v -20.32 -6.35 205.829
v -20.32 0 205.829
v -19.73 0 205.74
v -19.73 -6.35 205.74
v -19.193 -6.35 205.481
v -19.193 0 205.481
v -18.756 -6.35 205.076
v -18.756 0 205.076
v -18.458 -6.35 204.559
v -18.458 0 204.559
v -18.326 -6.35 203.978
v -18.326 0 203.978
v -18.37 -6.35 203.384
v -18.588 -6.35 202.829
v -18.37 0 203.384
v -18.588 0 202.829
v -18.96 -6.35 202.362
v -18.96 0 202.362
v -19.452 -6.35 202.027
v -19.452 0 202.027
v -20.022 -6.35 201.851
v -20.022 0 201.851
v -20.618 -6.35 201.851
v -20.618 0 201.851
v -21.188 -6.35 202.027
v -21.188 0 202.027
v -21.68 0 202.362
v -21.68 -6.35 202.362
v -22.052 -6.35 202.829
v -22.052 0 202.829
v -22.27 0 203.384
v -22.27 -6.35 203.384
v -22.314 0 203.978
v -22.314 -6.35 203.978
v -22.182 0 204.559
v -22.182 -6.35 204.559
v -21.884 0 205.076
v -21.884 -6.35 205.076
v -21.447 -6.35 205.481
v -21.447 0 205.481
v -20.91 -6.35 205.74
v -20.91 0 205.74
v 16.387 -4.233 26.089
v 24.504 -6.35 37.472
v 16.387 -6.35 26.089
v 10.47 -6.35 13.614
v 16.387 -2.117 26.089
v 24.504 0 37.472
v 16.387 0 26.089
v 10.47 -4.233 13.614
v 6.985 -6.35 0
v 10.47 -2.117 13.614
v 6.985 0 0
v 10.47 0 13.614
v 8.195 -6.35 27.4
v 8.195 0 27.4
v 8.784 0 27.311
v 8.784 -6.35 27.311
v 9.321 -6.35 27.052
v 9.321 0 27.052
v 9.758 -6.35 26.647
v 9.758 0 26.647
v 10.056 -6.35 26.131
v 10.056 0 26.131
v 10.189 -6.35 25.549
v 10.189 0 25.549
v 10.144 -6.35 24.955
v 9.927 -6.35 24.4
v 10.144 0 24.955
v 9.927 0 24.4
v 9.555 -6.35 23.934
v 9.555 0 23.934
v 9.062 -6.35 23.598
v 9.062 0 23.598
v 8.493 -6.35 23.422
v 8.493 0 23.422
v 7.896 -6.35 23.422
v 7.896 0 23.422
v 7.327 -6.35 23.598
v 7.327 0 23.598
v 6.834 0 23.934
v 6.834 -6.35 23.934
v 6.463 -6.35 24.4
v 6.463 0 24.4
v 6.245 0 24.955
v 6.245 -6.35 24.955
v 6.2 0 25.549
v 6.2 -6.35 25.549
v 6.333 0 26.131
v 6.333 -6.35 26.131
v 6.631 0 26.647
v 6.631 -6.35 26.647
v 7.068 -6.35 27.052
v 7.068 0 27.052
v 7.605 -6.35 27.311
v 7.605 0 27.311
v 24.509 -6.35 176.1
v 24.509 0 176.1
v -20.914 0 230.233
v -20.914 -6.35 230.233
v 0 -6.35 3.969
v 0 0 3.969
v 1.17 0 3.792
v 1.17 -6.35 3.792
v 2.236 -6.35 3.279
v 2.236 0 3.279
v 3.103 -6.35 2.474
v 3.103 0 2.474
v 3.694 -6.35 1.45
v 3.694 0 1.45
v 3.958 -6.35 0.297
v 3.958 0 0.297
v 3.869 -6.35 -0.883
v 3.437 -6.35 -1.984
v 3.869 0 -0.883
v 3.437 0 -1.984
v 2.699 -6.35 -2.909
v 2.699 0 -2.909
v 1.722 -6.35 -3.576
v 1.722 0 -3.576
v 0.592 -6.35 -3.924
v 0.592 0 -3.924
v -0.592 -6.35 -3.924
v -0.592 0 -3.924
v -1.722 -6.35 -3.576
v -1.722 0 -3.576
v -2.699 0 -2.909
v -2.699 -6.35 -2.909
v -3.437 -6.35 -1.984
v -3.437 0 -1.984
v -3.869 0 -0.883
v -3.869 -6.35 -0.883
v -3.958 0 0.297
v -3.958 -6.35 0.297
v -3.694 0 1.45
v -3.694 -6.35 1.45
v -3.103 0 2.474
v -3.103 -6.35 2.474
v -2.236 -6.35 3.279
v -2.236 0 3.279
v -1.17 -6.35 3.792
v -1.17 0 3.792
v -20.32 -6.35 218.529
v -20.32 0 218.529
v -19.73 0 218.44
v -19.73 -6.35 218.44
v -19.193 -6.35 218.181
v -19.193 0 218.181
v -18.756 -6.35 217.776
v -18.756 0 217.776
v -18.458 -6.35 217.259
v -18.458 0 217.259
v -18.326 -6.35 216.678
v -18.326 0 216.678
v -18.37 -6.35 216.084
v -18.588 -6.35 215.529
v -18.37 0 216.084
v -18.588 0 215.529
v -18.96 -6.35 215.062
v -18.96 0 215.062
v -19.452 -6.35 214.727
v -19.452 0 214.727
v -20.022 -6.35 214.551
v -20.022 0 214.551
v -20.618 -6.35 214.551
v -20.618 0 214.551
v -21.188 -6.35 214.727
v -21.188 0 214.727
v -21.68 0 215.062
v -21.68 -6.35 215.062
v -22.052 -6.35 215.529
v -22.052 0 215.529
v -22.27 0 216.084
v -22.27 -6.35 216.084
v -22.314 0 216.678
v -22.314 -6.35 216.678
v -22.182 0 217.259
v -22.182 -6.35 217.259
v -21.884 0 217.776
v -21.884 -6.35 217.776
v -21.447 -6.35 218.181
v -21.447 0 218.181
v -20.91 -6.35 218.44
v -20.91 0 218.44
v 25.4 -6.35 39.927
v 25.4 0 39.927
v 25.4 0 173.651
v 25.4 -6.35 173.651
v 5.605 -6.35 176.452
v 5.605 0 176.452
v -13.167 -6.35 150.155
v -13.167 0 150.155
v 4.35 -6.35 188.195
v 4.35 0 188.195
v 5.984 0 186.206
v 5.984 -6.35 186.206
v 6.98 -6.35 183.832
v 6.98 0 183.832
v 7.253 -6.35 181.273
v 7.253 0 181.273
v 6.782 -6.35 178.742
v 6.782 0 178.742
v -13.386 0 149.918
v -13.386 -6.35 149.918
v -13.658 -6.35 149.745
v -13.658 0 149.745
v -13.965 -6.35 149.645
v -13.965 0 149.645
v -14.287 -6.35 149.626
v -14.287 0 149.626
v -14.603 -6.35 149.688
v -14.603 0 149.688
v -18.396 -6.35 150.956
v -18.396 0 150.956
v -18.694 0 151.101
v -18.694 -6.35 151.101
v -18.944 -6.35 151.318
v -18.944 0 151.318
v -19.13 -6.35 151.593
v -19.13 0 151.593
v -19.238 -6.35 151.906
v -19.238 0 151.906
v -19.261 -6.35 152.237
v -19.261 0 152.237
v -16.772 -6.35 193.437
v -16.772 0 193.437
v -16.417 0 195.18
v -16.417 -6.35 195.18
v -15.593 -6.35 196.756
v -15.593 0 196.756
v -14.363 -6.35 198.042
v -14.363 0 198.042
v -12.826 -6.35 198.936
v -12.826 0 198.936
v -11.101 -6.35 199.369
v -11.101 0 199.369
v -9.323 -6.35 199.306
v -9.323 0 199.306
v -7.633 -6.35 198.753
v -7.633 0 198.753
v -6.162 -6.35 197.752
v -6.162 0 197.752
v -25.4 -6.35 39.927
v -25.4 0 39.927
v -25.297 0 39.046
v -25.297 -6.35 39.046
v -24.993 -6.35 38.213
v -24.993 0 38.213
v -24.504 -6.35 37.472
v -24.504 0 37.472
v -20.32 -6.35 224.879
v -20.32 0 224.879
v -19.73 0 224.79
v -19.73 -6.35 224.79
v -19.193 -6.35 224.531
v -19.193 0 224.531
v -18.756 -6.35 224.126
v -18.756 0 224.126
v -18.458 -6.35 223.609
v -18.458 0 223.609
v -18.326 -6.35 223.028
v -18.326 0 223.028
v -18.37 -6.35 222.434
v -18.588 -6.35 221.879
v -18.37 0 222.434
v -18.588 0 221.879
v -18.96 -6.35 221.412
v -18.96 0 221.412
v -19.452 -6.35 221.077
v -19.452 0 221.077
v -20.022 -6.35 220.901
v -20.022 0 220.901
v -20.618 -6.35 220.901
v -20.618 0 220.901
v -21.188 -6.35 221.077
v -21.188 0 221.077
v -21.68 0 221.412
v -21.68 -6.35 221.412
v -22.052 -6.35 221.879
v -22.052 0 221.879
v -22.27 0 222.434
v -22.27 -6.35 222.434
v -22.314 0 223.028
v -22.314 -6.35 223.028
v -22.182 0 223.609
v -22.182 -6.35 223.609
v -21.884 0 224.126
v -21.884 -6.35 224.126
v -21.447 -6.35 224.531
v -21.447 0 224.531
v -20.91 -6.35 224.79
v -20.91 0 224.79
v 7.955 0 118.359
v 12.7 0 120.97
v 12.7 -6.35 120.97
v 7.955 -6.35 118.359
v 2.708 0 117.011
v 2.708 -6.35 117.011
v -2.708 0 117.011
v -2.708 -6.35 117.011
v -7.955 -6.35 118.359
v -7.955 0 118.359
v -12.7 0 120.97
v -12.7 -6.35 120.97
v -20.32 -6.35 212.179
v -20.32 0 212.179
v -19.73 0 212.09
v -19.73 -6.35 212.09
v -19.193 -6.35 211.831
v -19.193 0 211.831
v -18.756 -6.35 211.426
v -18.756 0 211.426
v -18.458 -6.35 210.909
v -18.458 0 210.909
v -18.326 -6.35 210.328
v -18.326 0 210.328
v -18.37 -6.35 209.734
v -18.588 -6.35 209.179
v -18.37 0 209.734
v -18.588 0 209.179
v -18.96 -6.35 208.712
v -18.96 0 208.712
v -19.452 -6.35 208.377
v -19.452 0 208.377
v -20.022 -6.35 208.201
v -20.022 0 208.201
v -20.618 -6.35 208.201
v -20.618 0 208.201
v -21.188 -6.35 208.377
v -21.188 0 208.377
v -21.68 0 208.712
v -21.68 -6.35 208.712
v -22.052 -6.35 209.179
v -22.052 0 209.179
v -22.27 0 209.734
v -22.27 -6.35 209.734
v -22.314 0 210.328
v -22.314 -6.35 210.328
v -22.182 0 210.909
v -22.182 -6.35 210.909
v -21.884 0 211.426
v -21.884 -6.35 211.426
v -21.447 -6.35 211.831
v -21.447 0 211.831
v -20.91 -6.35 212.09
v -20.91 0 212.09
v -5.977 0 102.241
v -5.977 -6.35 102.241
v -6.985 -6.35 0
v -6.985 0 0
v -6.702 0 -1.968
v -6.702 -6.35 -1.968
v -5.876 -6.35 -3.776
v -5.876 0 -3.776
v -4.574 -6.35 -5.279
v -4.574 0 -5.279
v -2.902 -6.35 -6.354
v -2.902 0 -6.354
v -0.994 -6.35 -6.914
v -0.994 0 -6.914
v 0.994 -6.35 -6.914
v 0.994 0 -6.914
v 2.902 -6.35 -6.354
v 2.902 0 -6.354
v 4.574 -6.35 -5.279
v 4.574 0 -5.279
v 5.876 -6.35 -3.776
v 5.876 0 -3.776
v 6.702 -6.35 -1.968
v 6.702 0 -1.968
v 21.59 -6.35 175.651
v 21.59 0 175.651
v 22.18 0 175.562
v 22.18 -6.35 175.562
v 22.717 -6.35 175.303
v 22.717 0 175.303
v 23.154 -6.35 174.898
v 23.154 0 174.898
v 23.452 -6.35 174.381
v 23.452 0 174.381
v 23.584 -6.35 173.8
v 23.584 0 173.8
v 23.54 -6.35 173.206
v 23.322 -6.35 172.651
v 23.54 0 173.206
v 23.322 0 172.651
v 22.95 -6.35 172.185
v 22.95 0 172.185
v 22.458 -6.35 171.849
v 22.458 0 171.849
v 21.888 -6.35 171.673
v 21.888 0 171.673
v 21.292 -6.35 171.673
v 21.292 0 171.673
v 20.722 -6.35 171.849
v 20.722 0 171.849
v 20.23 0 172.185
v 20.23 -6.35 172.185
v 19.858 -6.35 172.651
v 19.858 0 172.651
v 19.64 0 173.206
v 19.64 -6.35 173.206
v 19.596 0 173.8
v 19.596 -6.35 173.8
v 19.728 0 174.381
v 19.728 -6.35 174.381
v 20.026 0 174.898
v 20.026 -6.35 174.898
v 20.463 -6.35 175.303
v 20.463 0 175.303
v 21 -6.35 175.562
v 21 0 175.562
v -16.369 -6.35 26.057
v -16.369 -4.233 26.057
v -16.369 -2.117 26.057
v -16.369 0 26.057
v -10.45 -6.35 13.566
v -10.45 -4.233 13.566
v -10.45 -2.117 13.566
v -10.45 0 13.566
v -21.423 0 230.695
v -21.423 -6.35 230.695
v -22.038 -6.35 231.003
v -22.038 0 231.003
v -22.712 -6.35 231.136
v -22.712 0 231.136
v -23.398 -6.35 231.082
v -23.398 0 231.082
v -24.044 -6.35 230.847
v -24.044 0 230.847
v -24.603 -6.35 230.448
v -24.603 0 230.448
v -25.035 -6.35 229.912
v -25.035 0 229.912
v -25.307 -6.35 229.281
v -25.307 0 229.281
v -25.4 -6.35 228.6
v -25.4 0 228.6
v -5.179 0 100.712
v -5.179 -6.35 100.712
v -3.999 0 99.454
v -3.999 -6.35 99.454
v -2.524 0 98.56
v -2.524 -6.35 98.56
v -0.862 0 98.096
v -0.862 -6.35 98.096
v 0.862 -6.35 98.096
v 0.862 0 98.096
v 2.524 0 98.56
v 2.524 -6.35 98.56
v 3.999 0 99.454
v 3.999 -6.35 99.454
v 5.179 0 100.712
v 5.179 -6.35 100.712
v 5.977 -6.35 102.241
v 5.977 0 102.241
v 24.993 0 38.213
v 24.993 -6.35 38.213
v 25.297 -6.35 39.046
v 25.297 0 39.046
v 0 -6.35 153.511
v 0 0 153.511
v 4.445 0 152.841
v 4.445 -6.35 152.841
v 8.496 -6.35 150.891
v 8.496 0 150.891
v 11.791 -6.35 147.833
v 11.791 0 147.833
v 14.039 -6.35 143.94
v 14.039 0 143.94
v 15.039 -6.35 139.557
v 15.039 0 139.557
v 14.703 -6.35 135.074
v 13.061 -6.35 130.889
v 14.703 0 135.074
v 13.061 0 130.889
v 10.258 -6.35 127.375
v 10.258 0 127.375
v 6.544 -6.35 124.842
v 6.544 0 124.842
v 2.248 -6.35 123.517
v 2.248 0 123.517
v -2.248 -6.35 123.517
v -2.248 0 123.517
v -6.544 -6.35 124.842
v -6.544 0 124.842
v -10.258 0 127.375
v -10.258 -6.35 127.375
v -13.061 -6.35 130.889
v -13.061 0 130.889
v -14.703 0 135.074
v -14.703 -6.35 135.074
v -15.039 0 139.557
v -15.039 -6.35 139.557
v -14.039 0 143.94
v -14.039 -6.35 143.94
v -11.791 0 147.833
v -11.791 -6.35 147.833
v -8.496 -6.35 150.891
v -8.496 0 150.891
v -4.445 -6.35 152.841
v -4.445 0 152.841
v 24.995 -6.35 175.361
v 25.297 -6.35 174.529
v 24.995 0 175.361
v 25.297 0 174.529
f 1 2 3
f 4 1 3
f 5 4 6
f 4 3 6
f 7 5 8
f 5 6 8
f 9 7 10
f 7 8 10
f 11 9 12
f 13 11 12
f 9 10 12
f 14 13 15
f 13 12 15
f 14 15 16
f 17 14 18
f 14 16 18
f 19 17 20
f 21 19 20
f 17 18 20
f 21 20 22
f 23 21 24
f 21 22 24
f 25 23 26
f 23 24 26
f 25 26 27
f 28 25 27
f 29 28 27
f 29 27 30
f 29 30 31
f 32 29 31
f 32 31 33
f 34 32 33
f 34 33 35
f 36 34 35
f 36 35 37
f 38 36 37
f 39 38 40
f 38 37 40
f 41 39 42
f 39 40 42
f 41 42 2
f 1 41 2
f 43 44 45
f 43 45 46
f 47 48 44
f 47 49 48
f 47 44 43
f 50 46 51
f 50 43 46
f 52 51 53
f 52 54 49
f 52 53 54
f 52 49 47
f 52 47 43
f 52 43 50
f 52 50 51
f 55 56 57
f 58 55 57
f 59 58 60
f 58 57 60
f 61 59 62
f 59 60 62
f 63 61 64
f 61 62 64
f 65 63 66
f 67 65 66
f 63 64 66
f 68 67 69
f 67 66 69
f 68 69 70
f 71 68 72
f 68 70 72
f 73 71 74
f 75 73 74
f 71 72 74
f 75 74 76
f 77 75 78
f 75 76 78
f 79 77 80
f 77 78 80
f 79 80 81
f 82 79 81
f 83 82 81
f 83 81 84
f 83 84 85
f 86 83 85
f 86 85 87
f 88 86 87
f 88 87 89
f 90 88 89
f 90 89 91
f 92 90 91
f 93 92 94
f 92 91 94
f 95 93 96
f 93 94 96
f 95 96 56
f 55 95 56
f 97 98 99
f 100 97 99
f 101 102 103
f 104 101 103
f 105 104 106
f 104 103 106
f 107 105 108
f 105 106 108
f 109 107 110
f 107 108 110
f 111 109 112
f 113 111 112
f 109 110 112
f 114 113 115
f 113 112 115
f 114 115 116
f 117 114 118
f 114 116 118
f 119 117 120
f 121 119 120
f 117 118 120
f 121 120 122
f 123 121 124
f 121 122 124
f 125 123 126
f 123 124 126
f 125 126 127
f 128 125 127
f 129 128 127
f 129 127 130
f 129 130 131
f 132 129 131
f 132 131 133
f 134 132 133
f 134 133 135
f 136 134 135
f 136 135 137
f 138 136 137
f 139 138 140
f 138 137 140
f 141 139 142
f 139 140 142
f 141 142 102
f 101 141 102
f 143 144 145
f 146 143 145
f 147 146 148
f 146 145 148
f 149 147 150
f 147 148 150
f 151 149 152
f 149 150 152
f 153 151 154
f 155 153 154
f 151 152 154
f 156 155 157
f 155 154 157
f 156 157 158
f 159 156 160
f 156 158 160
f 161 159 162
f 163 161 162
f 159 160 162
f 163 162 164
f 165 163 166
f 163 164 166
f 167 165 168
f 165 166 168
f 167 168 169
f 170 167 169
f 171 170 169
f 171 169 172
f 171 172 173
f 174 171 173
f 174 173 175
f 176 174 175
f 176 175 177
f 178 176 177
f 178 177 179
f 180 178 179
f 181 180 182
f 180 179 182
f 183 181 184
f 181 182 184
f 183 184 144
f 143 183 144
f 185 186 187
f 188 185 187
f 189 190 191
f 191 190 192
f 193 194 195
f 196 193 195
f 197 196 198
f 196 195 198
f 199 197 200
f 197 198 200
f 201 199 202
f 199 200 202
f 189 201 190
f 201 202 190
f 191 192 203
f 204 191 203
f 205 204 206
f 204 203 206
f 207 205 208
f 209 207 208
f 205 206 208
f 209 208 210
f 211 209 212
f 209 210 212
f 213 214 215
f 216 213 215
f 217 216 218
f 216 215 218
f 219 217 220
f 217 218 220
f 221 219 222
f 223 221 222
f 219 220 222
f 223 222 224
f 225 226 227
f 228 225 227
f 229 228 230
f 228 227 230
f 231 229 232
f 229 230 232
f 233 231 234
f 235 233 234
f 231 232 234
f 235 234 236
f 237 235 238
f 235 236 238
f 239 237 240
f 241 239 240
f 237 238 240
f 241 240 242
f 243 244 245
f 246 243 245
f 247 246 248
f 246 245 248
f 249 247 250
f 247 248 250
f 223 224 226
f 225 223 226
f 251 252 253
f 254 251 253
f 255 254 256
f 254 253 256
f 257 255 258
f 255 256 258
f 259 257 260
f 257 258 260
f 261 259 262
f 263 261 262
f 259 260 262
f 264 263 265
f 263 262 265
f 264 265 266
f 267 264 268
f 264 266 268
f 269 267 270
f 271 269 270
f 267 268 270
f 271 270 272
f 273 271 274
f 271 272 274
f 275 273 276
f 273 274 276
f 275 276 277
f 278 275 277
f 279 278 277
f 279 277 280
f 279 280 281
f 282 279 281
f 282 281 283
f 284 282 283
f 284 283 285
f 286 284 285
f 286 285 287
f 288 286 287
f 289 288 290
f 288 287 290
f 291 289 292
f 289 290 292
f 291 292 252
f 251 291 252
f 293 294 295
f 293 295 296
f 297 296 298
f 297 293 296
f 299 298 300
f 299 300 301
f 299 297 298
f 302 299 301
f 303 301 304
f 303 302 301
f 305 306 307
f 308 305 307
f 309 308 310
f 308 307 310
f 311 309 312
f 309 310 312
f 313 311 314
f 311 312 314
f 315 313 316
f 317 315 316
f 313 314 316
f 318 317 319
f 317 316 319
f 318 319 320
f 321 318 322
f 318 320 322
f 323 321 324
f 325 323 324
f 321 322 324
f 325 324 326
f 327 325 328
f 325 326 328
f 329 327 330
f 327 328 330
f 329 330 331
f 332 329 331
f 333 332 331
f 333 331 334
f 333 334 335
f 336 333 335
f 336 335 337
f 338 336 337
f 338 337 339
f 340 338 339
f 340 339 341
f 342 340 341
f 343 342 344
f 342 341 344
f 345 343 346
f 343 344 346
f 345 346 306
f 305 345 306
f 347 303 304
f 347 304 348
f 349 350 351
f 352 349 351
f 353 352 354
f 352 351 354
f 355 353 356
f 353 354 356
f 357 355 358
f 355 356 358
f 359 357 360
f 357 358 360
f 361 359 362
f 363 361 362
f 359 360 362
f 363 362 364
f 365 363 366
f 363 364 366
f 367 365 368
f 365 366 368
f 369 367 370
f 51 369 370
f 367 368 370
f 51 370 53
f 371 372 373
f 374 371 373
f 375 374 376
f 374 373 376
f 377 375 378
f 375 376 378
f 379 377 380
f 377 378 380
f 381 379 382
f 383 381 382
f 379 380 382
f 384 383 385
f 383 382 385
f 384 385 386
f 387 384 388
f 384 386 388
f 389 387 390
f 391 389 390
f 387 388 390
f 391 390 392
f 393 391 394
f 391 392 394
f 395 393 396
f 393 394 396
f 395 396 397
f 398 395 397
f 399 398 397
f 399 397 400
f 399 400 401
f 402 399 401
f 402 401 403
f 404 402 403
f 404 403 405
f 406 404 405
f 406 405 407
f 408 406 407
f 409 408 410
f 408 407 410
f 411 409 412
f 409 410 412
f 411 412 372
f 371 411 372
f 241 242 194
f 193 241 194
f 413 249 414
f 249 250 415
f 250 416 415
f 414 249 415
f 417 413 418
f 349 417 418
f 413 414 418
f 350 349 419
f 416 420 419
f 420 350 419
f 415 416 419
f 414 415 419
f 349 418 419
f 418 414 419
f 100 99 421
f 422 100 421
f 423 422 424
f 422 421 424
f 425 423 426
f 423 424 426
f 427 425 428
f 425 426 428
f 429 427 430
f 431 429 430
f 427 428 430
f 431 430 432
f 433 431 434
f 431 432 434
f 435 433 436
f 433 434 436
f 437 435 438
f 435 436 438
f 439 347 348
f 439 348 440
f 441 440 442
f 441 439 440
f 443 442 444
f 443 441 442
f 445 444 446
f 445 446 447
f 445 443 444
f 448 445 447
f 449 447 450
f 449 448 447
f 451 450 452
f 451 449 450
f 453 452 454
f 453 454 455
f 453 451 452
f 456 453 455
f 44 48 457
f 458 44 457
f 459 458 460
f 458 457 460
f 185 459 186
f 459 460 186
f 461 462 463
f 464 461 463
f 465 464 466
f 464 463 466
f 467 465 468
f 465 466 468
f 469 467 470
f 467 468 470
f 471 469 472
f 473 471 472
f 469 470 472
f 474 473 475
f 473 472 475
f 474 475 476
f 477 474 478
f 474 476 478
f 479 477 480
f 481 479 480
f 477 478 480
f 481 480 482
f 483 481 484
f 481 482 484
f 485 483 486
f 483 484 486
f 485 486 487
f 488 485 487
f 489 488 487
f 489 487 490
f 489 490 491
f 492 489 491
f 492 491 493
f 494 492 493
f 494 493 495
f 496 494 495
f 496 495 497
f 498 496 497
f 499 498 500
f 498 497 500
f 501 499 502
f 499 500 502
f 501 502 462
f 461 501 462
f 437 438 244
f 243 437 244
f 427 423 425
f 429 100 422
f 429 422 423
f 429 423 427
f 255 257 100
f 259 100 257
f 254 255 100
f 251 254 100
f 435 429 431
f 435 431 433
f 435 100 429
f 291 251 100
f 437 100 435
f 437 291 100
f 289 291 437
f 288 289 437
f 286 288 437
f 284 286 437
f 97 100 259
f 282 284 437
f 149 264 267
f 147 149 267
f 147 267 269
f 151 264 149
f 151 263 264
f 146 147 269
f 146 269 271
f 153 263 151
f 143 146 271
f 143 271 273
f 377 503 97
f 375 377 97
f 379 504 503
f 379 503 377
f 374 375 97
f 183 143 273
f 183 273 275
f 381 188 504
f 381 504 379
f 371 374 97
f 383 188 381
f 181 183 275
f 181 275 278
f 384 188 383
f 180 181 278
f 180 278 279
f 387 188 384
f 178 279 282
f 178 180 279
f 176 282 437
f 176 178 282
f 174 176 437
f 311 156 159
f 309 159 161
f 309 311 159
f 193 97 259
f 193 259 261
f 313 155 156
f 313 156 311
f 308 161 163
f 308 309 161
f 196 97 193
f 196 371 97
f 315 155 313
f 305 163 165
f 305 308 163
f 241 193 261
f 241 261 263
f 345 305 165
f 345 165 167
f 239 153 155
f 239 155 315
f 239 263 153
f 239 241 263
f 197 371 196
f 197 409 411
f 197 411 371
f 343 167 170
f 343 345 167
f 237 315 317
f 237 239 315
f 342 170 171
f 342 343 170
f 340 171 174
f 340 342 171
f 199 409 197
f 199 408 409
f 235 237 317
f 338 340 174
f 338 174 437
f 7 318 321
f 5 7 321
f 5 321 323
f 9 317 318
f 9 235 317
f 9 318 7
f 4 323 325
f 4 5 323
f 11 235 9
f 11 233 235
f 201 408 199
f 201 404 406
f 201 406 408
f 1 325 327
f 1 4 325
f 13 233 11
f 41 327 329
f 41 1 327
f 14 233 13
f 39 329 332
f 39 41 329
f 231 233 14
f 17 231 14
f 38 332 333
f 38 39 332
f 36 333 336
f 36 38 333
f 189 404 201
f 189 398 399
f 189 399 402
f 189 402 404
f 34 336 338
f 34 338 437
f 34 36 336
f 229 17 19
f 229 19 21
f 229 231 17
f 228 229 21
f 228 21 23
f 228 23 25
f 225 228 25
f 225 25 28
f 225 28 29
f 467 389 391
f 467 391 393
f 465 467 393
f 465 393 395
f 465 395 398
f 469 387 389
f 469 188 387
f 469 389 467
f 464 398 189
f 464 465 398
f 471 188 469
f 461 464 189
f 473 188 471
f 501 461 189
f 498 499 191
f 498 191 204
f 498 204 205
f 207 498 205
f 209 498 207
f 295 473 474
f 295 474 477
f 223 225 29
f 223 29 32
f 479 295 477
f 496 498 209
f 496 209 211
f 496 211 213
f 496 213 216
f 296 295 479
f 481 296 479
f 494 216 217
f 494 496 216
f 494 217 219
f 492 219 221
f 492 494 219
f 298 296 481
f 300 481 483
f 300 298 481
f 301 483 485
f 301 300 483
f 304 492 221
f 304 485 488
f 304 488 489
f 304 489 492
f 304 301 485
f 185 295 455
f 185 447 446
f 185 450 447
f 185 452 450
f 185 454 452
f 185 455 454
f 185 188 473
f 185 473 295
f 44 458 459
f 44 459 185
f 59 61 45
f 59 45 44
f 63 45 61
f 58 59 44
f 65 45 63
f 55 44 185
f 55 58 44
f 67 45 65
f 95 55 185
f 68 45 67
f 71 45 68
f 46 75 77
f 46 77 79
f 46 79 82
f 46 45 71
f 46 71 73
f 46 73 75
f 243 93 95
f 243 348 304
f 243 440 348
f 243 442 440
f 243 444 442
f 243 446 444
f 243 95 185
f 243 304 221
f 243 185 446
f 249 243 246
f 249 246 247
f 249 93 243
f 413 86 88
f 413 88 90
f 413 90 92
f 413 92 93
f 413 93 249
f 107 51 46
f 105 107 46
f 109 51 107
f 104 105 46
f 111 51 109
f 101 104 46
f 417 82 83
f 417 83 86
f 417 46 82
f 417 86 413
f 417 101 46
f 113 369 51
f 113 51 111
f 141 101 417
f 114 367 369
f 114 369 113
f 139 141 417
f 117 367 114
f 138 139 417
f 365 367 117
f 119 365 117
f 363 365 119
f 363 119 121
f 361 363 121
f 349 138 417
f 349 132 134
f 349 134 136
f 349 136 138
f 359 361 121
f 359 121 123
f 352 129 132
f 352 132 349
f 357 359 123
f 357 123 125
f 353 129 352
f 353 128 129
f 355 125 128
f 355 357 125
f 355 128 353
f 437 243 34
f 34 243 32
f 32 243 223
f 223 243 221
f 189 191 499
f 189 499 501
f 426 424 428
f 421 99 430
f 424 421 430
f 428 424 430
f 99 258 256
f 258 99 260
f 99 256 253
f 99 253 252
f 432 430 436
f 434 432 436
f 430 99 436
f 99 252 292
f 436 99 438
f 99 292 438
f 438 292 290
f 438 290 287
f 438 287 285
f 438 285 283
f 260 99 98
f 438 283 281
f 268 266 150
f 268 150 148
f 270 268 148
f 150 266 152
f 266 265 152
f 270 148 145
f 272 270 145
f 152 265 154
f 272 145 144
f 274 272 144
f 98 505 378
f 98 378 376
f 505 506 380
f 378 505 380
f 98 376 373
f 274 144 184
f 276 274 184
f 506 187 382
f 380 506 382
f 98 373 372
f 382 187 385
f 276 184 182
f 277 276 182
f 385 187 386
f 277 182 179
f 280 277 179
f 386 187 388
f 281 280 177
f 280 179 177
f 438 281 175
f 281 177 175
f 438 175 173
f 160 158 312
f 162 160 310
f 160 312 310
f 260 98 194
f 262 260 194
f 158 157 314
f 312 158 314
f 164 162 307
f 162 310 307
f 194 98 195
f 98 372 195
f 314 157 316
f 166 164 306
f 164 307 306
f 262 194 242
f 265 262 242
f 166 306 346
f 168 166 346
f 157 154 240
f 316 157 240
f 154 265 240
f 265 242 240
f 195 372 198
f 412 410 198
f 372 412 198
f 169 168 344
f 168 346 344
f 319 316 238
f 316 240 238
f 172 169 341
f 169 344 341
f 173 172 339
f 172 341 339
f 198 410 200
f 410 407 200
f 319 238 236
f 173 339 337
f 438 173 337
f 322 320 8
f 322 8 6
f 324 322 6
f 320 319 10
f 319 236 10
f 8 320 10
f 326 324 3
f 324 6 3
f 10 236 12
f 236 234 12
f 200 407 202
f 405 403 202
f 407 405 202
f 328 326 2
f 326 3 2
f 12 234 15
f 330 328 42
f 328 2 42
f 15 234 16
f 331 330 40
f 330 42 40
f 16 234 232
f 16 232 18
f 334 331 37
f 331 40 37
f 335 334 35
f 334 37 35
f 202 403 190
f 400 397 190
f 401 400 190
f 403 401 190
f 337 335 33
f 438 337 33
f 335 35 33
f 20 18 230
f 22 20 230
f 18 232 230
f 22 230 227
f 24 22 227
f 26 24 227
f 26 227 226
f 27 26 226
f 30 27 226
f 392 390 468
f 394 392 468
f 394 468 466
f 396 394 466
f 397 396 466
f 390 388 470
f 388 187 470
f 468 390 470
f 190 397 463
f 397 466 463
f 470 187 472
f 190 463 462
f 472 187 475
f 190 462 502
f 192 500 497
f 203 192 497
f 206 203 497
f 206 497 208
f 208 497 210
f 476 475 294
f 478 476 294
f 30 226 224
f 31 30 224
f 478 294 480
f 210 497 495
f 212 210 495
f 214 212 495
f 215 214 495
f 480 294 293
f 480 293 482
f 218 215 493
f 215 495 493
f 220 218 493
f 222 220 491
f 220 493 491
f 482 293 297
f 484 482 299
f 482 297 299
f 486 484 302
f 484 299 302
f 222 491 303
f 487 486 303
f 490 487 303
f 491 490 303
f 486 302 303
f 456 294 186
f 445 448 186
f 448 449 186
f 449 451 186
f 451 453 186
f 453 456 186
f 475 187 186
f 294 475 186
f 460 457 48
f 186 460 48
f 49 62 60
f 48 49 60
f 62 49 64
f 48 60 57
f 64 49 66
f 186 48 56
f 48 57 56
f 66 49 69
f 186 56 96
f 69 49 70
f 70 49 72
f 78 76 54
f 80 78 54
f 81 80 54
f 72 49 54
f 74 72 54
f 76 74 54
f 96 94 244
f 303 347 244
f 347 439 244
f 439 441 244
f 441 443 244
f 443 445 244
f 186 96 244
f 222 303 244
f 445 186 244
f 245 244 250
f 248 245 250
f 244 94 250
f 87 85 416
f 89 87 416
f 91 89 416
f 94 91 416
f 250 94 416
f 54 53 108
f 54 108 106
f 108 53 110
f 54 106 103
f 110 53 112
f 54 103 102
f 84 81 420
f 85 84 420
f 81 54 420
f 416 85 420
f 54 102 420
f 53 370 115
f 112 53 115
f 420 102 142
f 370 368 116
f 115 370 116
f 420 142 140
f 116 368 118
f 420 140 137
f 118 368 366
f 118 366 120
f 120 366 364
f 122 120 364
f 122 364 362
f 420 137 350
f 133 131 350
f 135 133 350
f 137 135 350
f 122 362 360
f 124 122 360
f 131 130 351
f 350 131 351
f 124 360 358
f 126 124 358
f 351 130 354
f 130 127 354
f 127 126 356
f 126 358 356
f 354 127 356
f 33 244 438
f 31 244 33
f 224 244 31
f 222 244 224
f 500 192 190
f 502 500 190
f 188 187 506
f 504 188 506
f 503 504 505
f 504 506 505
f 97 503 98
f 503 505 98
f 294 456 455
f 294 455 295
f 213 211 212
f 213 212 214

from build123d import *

# Parameters (mm, degrees)
SKETCH1_R           = 3.96875
SKETCH1_R_2         = 15.08125
SKETCH1_R_3         = 2
BOSS_EXTRUDE1_DEPTH = 6.35


with BuildPart() as part:
    # Sketch1 → Boss-Extrude1 (new body)
    with BuildSketch(Plane(origin=(0, 0, 0), x_dir=(1, 0, 0), z_dir=(0, 1, 0))):
        with BuildLine():
            Line((25.4, -39.926769414), (25.4, -173.650783549))
            ThreePointArc((25.4, -173.650783549), (25.170228885, -174.953880295), (24.508629328, -176.099804342))
            Line((24.508629328, -176.099804342), (-20.914247114, -230.232680529))
            ThreePointArc((-20.914247114, -230.232680529), (-23.728731164, -230.986819257), (-25.4, -228.6))
            Line((-25.4, -228.6), (-25.4, -39.926769414))
            ThreePointArc((-25.4, -39.926769414), (-25.169027772, -38.620377357), (-24.504115377, -37.472379149))
            add(Edge.make_bspline(
                [(-24.504115377, -37.472379149), (-15.341464403, -26.593497135), (-9.143369894, -14.104472305), (-6.985, 0)],
                knots=[0.031078099, 0.031078099, 0.031078099, 0.031078099, 1, 1, 1, 1], degree=3))
            ThreePointArc((-6.985, 0), (0, 6.985), (6.985, 0))
            add(Edge.make_bspline(
                [(24.504115377, -37.472379149), (15.363034866, -26.619107902), (9.178211427, -14.199965817), (6.985, 0)],
                knots=[0.031766068, 0.031766068, 0.031766068, 0.031766068, 1, 1, 1, 1], degree=3))
            ThreePointArc((24.504115377, -37.472379149), (25.169027772, -38.620377357), (25.4, -39.926769414))
        make_face()
        with Locations(Location((0, 0, 0), (0, 0, 270))):
            Circle(SKETCH1_R, mode=Mode.SUBTRACT)
        with Locations(Location((0, -138.43, 0), (0, 0, 270))):
            Circle(SKETCH1_R_2, mode=Mode.SUBTRACT)
        with Locations(Location((-20.32, -222.878592645, 0), (0, 0, 270))):
            Circle(SKETCH1_R_3, mode=Mode.SUBTRACT)
        with Locations(Location((-20.32, -216.528592645, 0), (0, 0, 270))):
            Circle(SKETCH1_R_3, mode=Mode.SUBTRACT)
        with Locations(Location((-20.32, -210.178592645, 0), (0, 0, 270))):
            Circle(SKETCH1_R_3, mode=Mode.SUBTRACT)
        with Locations(Location((-20.32, -203.828592645, 0), (0, 0, 270))):
            Circle(SKETCH1_R_3, mode=Mode.SUBTRACT)
        with Locations(Location((21.59, -173.650783549, 0), (0, 0, 270))):
            Circle(SKETCH1_R_3, mode=Mode.SUBTRACT)
        with Locations(Location((8.19455983, -25.4, 0), (0, 0, 270))):
            Circle(SKETCH1_R_3, mode=Mode.SUBTRACT)
        with BuildLine():
            Line((5.605496622, -176.452263434), (-13.166879596, -150.15491695))
            ThreePointArc((-13.166879596, -150.15491695), (-13.808086261, -149.684948511), (-14.603073846, -149.688274478))
            Line((-14.603073846, -149.688274478), (-18.395861473, -150.955793975))
            ThreePointArc((-18.395861473, -150.955793975), (-19.045805463, -151.449552817), (-19.26101006, -152.2368977))
            Line((-19.26101006, -152.2368977), (-16.771936742, -193.436924326))
            ThreePointArc((-16.771936742, -193.436924326), (-12.825939472, -198.936057494), (-6.161826947, -197.752434107))
            Line((-6.161826947, -197.752434107), (4.350250475, -188.195205906))
            ThreePointArc((4.350250475, -188.195205906), (7.209558699, -182.562287673), (5.605496622, -176.452263434))
        make_face(mode=Mode.SUBTRACT)
        with BuildLine():
            Line((-12.7, -120.970386602), (-5.976567434, -102.241338504))
            ThreePointArc((-5.976567434, -102.241338504), (0, -98.036831852), (5.976567434, -102.241338504))
            Line((5.976567434, -102.241338504), (12.7, -120.970386602))
            ThreePointArc((12.7, -120.970386602), (0, -116.84), (-12.7, -120.970386602))
        make_face(mode=Mode.SUBTRACT)
    extrude(amount=-BOSS_EXTRUDE1_DEPTH)


solid = part.part
